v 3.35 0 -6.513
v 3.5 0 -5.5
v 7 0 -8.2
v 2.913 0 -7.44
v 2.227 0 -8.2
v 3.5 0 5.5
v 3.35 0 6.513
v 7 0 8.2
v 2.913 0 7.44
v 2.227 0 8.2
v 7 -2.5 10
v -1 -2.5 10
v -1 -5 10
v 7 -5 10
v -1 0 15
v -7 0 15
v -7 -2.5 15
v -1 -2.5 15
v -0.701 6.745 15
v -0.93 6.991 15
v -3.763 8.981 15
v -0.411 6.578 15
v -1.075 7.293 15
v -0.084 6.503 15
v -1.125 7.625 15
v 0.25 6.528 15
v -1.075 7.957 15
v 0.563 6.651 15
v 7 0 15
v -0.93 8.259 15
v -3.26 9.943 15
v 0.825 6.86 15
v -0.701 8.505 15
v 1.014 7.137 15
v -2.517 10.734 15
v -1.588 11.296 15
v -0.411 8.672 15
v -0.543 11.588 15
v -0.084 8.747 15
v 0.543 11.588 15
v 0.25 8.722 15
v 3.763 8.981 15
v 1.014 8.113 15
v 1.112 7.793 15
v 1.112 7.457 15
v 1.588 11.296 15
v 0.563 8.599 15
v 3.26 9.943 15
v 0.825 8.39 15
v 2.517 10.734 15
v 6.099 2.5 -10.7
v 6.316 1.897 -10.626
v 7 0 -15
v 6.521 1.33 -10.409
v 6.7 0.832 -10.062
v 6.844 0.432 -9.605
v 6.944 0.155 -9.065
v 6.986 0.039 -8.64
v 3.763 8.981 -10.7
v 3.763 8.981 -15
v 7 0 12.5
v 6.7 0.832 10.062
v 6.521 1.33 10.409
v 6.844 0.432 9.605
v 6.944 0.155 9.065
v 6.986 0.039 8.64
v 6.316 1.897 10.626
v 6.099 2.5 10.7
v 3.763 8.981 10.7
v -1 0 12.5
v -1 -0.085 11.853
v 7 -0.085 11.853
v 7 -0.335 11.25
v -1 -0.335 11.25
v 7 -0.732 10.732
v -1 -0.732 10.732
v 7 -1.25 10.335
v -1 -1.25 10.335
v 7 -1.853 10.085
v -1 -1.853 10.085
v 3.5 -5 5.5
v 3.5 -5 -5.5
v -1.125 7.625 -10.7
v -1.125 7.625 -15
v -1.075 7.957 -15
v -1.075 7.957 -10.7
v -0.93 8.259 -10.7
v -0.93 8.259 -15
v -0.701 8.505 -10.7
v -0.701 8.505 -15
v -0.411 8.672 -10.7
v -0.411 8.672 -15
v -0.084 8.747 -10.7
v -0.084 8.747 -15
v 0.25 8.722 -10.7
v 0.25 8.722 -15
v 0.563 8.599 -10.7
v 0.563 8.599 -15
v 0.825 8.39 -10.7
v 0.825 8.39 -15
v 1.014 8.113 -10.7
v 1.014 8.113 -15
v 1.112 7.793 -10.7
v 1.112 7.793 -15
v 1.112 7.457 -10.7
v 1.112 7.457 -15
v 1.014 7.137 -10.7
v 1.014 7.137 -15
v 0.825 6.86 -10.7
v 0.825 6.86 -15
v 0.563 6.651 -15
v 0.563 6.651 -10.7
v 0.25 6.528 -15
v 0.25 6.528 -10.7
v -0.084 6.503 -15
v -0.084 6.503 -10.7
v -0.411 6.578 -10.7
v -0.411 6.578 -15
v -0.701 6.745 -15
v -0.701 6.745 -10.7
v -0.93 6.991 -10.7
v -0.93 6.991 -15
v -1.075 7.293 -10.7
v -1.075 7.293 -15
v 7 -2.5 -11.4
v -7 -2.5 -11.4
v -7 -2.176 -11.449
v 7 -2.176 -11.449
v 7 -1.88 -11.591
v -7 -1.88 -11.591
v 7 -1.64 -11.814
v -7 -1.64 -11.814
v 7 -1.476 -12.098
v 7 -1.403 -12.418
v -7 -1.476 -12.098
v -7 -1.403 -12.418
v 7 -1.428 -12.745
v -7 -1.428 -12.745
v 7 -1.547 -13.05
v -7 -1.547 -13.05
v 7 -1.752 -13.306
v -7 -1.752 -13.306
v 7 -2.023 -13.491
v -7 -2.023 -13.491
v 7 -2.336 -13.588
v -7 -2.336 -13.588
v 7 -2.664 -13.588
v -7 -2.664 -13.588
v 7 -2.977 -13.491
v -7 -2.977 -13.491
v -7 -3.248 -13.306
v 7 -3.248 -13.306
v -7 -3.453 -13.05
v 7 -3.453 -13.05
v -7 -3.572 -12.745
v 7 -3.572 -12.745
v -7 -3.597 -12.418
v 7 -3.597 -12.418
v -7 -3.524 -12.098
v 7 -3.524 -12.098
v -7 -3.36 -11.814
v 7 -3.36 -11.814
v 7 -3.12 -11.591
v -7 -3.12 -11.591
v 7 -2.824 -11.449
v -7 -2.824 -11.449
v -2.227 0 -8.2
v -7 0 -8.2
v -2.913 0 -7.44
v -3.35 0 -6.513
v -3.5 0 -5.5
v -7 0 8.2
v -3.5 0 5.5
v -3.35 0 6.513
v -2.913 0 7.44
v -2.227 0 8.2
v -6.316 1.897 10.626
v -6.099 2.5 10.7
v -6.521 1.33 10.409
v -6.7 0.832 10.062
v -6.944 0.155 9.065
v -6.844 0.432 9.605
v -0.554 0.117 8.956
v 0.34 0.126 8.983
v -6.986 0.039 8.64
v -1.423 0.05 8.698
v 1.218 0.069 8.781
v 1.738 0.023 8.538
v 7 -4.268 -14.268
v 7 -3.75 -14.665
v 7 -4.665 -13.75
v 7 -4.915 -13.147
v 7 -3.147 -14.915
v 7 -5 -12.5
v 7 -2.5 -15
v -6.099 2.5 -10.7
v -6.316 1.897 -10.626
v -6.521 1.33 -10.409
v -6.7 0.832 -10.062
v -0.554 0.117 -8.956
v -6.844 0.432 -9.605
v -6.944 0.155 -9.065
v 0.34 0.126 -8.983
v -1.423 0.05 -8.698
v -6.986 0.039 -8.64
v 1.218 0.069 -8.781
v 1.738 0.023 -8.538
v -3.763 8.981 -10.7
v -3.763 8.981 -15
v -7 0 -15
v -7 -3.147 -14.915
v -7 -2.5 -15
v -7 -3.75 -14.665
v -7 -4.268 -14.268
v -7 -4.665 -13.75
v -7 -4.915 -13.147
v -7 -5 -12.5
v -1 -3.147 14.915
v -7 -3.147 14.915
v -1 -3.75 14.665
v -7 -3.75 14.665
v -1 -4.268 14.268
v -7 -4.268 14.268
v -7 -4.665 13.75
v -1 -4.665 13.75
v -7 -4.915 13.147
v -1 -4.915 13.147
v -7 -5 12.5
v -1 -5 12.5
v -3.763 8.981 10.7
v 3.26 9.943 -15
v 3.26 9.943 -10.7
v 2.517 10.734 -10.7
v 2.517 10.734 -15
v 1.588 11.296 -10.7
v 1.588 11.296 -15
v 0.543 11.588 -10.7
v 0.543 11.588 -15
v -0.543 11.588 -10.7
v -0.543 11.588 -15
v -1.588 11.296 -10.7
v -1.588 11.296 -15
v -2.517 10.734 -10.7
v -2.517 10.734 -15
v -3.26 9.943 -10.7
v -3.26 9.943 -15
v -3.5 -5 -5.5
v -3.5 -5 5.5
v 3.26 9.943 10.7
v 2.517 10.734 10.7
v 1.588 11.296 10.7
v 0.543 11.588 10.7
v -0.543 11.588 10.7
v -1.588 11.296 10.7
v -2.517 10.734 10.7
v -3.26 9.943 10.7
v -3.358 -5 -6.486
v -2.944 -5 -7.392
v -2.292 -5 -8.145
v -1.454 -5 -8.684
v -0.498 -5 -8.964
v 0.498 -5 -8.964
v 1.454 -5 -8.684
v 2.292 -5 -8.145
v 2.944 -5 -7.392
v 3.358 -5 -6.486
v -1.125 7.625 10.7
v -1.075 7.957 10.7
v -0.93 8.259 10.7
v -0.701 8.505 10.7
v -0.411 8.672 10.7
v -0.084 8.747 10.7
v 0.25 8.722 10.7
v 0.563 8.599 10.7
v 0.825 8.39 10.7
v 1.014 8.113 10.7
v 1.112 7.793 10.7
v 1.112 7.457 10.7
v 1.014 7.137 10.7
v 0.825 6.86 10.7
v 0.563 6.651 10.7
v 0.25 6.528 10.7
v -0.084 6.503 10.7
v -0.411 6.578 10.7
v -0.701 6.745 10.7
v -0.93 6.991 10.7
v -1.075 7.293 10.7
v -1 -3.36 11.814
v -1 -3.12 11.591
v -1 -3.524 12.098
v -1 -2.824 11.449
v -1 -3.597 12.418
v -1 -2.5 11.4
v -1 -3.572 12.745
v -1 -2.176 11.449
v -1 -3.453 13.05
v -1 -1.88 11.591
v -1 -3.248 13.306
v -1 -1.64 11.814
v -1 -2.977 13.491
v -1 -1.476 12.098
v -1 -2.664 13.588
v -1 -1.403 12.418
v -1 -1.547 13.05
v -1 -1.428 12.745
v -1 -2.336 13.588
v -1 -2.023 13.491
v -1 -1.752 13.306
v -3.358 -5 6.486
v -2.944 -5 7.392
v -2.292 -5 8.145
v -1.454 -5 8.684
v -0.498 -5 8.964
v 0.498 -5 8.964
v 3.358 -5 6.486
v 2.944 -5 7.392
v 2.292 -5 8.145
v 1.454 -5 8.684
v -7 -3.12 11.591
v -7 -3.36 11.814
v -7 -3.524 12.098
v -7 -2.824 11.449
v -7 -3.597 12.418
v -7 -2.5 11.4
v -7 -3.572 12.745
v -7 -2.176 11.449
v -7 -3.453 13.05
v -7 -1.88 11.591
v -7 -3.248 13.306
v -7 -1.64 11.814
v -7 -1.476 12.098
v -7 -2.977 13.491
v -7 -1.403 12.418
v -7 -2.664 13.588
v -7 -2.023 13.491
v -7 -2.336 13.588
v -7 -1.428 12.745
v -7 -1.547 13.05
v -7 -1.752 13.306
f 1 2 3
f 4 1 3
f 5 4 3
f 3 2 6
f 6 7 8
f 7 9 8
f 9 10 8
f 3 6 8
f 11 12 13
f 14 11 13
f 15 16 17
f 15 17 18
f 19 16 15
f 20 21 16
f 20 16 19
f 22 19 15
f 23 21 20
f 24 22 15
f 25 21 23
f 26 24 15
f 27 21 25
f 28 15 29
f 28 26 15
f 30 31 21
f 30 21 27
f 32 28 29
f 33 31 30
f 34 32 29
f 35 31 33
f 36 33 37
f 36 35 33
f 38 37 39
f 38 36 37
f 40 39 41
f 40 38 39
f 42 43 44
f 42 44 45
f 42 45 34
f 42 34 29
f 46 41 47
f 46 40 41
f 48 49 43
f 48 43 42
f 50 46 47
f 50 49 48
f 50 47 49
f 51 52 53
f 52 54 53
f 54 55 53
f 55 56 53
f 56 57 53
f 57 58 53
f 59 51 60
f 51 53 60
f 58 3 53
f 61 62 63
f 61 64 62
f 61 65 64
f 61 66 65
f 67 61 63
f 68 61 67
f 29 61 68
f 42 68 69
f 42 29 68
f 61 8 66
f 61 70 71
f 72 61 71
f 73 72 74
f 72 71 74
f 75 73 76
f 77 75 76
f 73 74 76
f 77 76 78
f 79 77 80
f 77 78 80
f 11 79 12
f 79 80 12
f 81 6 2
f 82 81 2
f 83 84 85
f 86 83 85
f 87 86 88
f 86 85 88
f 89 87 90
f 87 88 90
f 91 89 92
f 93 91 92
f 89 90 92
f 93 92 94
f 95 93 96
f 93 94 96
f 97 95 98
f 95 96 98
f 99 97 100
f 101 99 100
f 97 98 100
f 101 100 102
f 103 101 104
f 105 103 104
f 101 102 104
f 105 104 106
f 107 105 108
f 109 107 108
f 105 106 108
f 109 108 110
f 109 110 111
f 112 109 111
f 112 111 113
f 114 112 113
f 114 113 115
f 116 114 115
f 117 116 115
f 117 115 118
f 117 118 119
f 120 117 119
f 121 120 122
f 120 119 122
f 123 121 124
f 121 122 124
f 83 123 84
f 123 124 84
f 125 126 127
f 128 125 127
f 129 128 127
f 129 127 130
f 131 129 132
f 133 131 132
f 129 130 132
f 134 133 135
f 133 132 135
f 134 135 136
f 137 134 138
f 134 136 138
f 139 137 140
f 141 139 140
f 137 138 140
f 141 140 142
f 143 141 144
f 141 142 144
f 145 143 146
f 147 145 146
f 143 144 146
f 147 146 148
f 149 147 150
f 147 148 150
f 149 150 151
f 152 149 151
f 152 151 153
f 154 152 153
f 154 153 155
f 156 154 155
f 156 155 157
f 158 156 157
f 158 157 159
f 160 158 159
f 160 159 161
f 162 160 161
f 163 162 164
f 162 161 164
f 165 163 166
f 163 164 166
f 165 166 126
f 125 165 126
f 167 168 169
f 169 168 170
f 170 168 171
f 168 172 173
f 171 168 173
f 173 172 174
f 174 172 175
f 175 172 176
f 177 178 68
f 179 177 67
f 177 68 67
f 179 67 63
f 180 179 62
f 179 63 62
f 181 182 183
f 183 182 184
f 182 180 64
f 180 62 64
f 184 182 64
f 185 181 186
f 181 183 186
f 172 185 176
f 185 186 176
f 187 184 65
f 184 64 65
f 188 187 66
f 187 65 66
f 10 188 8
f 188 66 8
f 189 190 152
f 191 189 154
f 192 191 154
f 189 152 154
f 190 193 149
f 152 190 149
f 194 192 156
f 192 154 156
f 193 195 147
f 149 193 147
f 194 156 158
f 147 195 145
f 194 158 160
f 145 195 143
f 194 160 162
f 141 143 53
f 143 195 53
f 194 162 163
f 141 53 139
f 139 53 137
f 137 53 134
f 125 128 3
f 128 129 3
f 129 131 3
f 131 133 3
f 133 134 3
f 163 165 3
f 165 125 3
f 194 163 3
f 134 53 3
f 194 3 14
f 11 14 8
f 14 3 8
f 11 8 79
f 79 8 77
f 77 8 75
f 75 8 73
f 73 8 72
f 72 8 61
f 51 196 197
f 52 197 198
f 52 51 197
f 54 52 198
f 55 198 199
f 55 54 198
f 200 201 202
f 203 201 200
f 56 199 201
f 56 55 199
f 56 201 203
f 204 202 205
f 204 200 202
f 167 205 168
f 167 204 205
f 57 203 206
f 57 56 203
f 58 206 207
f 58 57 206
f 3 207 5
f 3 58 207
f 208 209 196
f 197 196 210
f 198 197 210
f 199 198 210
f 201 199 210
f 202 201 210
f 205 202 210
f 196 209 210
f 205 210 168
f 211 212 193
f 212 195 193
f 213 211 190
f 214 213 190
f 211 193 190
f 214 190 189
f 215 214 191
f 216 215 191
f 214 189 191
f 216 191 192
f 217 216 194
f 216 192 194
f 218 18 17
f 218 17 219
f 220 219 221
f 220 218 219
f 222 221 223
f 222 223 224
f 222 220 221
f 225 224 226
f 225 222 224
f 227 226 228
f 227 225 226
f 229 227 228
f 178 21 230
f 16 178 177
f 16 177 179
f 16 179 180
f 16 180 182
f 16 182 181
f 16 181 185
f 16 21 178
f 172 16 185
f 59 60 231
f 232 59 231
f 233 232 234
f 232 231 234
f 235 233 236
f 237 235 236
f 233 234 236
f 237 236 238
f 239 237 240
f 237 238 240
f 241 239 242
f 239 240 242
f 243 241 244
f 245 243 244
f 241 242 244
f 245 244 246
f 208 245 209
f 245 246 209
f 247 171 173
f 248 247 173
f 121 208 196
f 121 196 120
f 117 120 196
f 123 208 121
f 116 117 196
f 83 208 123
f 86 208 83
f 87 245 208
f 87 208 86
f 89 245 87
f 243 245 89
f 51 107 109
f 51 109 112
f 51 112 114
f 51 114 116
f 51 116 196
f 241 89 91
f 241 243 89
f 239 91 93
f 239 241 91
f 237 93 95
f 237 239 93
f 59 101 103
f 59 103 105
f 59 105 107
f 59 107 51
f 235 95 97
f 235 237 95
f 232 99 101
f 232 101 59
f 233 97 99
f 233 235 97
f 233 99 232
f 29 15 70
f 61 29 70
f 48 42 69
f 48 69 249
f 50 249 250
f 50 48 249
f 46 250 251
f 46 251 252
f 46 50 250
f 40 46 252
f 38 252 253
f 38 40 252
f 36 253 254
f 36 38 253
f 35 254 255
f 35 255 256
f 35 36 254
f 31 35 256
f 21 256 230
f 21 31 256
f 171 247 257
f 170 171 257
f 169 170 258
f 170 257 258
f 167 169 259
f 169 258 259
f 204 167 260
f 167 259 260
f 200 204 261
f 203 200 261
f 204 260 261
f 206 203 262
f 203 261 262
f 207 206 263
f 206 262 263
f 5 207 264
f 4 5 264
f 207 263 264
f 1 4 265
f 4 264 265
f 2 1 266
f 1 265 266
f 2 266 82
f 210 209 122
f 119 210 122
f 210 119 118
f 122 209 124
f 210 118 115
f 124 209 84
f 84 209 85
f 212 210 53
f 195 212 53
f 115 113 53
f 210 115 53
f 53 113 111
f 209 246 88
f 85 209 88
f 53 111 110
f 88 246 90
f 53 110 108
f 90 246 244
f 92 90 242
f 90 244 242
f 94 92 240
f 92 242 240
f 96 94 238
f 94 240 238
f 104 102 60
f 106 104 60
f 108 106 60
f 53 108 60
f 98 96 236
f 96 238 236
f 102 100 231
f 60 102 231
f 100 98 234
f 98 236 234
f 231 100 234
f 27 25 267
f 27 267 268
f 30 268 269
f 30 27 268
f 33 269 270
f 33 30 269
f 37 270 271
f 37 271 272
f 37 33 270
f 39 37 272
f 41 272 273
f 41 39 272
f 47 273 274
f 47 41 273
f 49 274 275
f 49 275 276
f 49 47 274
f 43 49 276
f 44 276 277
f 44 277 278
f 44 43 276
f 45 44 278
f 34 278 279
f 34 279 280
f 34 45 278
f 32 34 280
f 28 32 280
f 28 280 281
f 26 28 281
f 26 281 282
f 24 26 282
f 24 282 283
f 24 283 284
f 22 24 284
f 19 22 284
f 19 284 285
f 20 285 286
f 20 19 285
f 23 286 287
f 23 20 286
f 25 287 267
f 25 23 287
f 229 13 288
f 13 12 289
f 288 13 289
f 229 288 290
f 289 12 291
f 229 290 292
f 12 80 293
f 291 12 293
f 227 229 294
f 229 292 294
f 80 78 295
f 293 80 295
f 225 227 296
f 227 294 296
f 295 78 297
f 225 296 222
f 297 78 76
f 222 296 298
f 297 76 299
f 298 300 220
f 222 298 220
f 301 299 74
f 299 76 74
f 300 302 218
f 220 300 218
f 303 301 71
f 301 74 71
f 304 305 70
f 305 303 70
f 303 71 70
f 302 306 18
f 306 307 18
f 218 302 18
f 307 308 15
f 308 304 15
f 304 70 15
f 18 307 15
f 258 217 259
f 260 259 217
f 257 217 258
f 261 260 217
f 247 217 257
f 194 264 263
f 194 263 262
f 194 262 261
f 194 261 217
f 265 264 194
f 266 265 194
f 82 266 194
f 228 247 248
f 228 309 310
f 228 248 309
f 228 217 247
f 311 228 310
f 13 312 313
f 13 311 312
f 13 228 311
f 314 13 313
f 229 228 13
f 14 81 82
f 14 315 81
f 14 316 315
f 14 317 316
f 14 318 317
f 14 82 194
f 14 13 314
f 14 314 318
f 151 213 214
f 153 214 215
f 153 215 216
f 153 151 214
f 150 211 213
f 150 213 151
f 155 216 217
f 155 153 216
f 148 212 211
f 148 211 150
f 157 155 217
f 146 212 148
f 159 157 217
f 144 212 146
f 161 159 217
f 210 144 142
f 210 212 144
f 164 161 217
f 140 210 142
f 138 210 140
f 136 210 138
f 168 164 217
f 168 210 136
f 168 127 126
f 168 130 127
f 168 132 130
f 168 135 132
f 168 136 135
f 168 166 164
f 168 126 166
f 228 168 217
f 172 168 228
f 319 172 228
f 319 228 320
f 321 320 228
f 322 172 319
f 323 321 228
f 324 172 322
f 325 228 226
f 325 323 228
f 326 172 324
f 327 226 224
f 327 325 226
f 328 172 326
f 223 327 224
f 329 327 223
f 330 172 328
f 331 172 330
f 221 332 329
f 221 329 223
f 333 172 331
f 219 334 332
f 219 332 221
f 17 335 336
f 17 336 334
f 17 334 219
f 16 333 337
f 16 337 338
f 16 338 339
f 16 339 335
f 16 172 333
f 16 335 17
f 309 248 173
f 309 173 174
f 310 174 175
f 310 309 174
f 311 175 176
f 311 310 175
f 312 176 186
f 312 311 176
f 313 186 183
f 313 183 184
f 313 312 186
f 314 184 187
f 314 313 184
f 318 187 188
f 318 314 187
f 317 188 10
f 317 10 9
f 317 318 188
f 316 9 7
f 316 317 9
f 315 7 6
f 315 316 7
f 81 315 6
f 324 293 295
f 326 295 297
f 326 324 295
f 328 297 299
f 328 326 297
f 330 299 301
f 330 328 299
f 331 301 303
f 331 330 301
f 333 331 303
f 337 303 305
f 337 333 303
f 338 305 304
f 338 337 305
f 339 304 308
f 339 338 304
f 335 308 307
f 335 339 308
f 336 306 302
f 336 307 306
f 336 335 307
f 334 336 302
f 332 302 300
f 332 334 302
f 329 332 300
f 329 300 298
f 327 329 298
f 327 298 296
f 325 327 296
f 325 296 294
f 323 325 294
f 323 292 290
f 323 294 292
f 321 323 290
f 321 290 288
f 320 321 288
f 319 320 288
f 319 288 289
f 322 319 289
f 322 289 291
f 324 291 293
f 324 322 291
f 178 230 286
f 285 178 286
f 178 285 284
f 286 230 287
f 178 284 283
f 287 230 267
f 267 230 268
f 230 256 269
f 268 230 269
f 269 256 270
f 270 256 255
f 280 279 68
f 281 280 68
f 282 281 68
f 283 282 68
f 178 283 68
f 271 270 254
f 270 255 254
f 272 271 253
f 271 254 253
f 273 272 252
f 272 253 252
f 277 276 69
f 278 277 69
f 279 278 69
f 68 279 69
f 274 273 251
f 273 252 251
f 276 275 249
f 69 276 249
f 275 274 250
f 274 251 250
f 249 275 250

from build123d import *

# Parameters (mm, degrees)
SKETCH1_W                      = 14
SKETCH1_H                      = 15
BOSS_EXTRUDE1_DEPTH            = 5
SKETCH3_R                      = 1.1
CUT_EXTRUDE1_DEPTH             = 14
BOSS_EXTRUDE2_DEPTH            = 4.3
SKETCH5_R                      = 1.125
CUT_EXTRUDE2_DEPTH             = 4.3
FILLET1_R                      = 2.5
CUT_EXTRUDE3_REACH             = 22.227
CUT_EXTRUDE3_DIRECTION_2_REACH = 22.227
CUT_EXTRUDE4_START             = -6
CUT_EXTRUDE4_DEPTH             = 8


with BuildPart() as part:
    # Sketch1 → Boss-Extrude1 (new body)
    with BuildSketch(Plane(origin=(0, 0, 0), x_dir=(1, 0, 0), z_dir=(0, 1, 0))):
        with Locations((0, 7.5)):
            Rectangle(SKETCH1_W, SKETCH1_H)
    extrude(amount=-BOSS_EXTRUDE1_DEPTH)

    # Sketch3 → Cut-Extrude1 (cut)
    with BuildSketch(Plane.ZY.offset(7)):
        with Locations((-12.5, -2.5)):
            Circle(SKETCH3_R)
    extrude(amount=-CUT_EXTRUDE1_DEPTH, mode=Mode.SUBTRACT)

    # Sketch4 → Boss-Extrude2 (add)
    with BuildSketch(Plane(origin=(0, 0, -15), x_dir=(-1, 0, 0), z_dir=(0, 0, -1))):
        with BuildLine():
            Line((-7, 0), (-3.763056055, 8.981248181))
            ThreePointArc((-3.763056055, 8.981248181), (0, 11.625), (3.763056055, 8.981248181))
            Line((3.763056055, 8.981248181), (7, 0))
            Line((7, 0), (-7, 0))
        make_face()
    extrude(amount=-BOSS_EXTRUDE2_DEPTH)

    # Sketch5 → Cut-Extrude2 (cut)
    with BuildSketch(Plane(origin=(0, 0, -15), x_dir=(-1, 0, 0), z_dir=(0, 0, -1))):
        with Locations((0, 7.625)):
            Circle(SKETCH5_R)
    extrude(amount=-CUT_EXTRUDE2_DEPTH, mode=Mode.SUBTRACT)

    # Fillet1
    fillet1_edges = [part.edges().sort_by_distance(p)[0] for p in [
        (0, -5, -15),
        (0, 0, -10.7),
    ]]
    fillet(fillet1_edges, radius=FILLET1_R)

    # Sketch6 → Cut-Extrude3 (cut, up to next)
    with BuildSketch(Plane(origin=(0, 0, 0), x_dir=(1, 0, 0), z_dir=(0, 1, 0)), mode=Mode.PRIVATE) as cut_extrude3_sk1:
        with BuildLine():
            Line((-3.5, -5.5), (-3.5, 5.5))
            ThreePointArc((-3.5, 5.5), (0, 9), (3.5, 5.5))
            Line((3.5, 5.5), (3.5, -5.5))
            ThreePointArc((3.5, -5.5), (0, -9), (-3.5, -5.5))
        make_face()
    cut_extrude3_tool1 = extrude(cut_extrude3_sk1.sketch, amount=-CUT_EXTRUDE3_REACH, mode=Mode.PRIVATE) & part.part
    add(cut_extrude3_tool1.solids().sort_by_distance((0, 0, 0))[0], mode=Mode.SUBTRACT)

    # Sketch6 → Cut-Extrude3 direction 2 (cut, up to next)
    with BuildSketch(Plane(origin=(0, 0, 0), x_dir=(1, 0, 0), z_dir=(0, 1, 0)), mode=Mode.PRIVATE) as cut_extrude3_direction_2_sk1:
        with BuildLine():
            Line((-3.5, -5.5), (-3.5, 5.5))
            ThreePointArc((-3.5, 5.5), (0, 9), (3.5, 5.5))
            Line((3.5, 5.5), (3.5, -5.5))
            ThreePointArc((3.5, -5.5), (0, -9), (-3.5, -5.5))
        make_face()
    cut_extrude3_direction_2_tool1 = extrude(cut_extrude3_direction_2_sk1.sketch, amount=CUT_EXTRUDE3_DIRECTION_2_REACH, mode=Mode.PRIVATE) & part.part
    add(cut_extrude3_direction_2_tool1.solids().sort_by_distance((0, 0, 0))[0], mode=Mode.SUBTRACT)

    # Mirror1: part across plane


with BuildPart() as part_1:
    add(part.part)
    add(part.part.mirror(Plane.XY))

    # Sketch10 → Cut-Extrude4 (cut)
    with BuildSketch(Plane.ZY.offset(7).offset(CUT_EXTRUDE4_START)):
        with BuildLine():
            ThreePointArc((15, -2.5), (14.267766953, -0.732233047), (12.5, 0))
            ThreePointArc((12.5, 0), (10.732233047, -0.732233047), (10, -2.5))
            ThreePointArc((10, -2.5), (10.732233047, -4.267766953), (12.5, -5))
            ThreePointArc((12.5, -5), (14.267766953, -4.267766953), (15, -2.5))
        make_face()
        with BuildLine():
            Line((15, 0), (12.5, 0))
            ThreePointArc((12.5, 0), (14.267766953, -0.732233047), (15, -2.5))
            Line((15, -2.5), (15, 0))
        make_face()
        with BuildLine():
            ThreePointArc((12.5, -5), (10.732233047, -4.267766953), (10, -2.5))
            Line((10, -2.5), (10, -5))
            Line((10, -5), (12.5, -5))
        make_face()
    extrude(amount=-CUT_EXTRUDE4_DEPTH, mode=Mode.SUBTRACT)


solid = part_1.part
